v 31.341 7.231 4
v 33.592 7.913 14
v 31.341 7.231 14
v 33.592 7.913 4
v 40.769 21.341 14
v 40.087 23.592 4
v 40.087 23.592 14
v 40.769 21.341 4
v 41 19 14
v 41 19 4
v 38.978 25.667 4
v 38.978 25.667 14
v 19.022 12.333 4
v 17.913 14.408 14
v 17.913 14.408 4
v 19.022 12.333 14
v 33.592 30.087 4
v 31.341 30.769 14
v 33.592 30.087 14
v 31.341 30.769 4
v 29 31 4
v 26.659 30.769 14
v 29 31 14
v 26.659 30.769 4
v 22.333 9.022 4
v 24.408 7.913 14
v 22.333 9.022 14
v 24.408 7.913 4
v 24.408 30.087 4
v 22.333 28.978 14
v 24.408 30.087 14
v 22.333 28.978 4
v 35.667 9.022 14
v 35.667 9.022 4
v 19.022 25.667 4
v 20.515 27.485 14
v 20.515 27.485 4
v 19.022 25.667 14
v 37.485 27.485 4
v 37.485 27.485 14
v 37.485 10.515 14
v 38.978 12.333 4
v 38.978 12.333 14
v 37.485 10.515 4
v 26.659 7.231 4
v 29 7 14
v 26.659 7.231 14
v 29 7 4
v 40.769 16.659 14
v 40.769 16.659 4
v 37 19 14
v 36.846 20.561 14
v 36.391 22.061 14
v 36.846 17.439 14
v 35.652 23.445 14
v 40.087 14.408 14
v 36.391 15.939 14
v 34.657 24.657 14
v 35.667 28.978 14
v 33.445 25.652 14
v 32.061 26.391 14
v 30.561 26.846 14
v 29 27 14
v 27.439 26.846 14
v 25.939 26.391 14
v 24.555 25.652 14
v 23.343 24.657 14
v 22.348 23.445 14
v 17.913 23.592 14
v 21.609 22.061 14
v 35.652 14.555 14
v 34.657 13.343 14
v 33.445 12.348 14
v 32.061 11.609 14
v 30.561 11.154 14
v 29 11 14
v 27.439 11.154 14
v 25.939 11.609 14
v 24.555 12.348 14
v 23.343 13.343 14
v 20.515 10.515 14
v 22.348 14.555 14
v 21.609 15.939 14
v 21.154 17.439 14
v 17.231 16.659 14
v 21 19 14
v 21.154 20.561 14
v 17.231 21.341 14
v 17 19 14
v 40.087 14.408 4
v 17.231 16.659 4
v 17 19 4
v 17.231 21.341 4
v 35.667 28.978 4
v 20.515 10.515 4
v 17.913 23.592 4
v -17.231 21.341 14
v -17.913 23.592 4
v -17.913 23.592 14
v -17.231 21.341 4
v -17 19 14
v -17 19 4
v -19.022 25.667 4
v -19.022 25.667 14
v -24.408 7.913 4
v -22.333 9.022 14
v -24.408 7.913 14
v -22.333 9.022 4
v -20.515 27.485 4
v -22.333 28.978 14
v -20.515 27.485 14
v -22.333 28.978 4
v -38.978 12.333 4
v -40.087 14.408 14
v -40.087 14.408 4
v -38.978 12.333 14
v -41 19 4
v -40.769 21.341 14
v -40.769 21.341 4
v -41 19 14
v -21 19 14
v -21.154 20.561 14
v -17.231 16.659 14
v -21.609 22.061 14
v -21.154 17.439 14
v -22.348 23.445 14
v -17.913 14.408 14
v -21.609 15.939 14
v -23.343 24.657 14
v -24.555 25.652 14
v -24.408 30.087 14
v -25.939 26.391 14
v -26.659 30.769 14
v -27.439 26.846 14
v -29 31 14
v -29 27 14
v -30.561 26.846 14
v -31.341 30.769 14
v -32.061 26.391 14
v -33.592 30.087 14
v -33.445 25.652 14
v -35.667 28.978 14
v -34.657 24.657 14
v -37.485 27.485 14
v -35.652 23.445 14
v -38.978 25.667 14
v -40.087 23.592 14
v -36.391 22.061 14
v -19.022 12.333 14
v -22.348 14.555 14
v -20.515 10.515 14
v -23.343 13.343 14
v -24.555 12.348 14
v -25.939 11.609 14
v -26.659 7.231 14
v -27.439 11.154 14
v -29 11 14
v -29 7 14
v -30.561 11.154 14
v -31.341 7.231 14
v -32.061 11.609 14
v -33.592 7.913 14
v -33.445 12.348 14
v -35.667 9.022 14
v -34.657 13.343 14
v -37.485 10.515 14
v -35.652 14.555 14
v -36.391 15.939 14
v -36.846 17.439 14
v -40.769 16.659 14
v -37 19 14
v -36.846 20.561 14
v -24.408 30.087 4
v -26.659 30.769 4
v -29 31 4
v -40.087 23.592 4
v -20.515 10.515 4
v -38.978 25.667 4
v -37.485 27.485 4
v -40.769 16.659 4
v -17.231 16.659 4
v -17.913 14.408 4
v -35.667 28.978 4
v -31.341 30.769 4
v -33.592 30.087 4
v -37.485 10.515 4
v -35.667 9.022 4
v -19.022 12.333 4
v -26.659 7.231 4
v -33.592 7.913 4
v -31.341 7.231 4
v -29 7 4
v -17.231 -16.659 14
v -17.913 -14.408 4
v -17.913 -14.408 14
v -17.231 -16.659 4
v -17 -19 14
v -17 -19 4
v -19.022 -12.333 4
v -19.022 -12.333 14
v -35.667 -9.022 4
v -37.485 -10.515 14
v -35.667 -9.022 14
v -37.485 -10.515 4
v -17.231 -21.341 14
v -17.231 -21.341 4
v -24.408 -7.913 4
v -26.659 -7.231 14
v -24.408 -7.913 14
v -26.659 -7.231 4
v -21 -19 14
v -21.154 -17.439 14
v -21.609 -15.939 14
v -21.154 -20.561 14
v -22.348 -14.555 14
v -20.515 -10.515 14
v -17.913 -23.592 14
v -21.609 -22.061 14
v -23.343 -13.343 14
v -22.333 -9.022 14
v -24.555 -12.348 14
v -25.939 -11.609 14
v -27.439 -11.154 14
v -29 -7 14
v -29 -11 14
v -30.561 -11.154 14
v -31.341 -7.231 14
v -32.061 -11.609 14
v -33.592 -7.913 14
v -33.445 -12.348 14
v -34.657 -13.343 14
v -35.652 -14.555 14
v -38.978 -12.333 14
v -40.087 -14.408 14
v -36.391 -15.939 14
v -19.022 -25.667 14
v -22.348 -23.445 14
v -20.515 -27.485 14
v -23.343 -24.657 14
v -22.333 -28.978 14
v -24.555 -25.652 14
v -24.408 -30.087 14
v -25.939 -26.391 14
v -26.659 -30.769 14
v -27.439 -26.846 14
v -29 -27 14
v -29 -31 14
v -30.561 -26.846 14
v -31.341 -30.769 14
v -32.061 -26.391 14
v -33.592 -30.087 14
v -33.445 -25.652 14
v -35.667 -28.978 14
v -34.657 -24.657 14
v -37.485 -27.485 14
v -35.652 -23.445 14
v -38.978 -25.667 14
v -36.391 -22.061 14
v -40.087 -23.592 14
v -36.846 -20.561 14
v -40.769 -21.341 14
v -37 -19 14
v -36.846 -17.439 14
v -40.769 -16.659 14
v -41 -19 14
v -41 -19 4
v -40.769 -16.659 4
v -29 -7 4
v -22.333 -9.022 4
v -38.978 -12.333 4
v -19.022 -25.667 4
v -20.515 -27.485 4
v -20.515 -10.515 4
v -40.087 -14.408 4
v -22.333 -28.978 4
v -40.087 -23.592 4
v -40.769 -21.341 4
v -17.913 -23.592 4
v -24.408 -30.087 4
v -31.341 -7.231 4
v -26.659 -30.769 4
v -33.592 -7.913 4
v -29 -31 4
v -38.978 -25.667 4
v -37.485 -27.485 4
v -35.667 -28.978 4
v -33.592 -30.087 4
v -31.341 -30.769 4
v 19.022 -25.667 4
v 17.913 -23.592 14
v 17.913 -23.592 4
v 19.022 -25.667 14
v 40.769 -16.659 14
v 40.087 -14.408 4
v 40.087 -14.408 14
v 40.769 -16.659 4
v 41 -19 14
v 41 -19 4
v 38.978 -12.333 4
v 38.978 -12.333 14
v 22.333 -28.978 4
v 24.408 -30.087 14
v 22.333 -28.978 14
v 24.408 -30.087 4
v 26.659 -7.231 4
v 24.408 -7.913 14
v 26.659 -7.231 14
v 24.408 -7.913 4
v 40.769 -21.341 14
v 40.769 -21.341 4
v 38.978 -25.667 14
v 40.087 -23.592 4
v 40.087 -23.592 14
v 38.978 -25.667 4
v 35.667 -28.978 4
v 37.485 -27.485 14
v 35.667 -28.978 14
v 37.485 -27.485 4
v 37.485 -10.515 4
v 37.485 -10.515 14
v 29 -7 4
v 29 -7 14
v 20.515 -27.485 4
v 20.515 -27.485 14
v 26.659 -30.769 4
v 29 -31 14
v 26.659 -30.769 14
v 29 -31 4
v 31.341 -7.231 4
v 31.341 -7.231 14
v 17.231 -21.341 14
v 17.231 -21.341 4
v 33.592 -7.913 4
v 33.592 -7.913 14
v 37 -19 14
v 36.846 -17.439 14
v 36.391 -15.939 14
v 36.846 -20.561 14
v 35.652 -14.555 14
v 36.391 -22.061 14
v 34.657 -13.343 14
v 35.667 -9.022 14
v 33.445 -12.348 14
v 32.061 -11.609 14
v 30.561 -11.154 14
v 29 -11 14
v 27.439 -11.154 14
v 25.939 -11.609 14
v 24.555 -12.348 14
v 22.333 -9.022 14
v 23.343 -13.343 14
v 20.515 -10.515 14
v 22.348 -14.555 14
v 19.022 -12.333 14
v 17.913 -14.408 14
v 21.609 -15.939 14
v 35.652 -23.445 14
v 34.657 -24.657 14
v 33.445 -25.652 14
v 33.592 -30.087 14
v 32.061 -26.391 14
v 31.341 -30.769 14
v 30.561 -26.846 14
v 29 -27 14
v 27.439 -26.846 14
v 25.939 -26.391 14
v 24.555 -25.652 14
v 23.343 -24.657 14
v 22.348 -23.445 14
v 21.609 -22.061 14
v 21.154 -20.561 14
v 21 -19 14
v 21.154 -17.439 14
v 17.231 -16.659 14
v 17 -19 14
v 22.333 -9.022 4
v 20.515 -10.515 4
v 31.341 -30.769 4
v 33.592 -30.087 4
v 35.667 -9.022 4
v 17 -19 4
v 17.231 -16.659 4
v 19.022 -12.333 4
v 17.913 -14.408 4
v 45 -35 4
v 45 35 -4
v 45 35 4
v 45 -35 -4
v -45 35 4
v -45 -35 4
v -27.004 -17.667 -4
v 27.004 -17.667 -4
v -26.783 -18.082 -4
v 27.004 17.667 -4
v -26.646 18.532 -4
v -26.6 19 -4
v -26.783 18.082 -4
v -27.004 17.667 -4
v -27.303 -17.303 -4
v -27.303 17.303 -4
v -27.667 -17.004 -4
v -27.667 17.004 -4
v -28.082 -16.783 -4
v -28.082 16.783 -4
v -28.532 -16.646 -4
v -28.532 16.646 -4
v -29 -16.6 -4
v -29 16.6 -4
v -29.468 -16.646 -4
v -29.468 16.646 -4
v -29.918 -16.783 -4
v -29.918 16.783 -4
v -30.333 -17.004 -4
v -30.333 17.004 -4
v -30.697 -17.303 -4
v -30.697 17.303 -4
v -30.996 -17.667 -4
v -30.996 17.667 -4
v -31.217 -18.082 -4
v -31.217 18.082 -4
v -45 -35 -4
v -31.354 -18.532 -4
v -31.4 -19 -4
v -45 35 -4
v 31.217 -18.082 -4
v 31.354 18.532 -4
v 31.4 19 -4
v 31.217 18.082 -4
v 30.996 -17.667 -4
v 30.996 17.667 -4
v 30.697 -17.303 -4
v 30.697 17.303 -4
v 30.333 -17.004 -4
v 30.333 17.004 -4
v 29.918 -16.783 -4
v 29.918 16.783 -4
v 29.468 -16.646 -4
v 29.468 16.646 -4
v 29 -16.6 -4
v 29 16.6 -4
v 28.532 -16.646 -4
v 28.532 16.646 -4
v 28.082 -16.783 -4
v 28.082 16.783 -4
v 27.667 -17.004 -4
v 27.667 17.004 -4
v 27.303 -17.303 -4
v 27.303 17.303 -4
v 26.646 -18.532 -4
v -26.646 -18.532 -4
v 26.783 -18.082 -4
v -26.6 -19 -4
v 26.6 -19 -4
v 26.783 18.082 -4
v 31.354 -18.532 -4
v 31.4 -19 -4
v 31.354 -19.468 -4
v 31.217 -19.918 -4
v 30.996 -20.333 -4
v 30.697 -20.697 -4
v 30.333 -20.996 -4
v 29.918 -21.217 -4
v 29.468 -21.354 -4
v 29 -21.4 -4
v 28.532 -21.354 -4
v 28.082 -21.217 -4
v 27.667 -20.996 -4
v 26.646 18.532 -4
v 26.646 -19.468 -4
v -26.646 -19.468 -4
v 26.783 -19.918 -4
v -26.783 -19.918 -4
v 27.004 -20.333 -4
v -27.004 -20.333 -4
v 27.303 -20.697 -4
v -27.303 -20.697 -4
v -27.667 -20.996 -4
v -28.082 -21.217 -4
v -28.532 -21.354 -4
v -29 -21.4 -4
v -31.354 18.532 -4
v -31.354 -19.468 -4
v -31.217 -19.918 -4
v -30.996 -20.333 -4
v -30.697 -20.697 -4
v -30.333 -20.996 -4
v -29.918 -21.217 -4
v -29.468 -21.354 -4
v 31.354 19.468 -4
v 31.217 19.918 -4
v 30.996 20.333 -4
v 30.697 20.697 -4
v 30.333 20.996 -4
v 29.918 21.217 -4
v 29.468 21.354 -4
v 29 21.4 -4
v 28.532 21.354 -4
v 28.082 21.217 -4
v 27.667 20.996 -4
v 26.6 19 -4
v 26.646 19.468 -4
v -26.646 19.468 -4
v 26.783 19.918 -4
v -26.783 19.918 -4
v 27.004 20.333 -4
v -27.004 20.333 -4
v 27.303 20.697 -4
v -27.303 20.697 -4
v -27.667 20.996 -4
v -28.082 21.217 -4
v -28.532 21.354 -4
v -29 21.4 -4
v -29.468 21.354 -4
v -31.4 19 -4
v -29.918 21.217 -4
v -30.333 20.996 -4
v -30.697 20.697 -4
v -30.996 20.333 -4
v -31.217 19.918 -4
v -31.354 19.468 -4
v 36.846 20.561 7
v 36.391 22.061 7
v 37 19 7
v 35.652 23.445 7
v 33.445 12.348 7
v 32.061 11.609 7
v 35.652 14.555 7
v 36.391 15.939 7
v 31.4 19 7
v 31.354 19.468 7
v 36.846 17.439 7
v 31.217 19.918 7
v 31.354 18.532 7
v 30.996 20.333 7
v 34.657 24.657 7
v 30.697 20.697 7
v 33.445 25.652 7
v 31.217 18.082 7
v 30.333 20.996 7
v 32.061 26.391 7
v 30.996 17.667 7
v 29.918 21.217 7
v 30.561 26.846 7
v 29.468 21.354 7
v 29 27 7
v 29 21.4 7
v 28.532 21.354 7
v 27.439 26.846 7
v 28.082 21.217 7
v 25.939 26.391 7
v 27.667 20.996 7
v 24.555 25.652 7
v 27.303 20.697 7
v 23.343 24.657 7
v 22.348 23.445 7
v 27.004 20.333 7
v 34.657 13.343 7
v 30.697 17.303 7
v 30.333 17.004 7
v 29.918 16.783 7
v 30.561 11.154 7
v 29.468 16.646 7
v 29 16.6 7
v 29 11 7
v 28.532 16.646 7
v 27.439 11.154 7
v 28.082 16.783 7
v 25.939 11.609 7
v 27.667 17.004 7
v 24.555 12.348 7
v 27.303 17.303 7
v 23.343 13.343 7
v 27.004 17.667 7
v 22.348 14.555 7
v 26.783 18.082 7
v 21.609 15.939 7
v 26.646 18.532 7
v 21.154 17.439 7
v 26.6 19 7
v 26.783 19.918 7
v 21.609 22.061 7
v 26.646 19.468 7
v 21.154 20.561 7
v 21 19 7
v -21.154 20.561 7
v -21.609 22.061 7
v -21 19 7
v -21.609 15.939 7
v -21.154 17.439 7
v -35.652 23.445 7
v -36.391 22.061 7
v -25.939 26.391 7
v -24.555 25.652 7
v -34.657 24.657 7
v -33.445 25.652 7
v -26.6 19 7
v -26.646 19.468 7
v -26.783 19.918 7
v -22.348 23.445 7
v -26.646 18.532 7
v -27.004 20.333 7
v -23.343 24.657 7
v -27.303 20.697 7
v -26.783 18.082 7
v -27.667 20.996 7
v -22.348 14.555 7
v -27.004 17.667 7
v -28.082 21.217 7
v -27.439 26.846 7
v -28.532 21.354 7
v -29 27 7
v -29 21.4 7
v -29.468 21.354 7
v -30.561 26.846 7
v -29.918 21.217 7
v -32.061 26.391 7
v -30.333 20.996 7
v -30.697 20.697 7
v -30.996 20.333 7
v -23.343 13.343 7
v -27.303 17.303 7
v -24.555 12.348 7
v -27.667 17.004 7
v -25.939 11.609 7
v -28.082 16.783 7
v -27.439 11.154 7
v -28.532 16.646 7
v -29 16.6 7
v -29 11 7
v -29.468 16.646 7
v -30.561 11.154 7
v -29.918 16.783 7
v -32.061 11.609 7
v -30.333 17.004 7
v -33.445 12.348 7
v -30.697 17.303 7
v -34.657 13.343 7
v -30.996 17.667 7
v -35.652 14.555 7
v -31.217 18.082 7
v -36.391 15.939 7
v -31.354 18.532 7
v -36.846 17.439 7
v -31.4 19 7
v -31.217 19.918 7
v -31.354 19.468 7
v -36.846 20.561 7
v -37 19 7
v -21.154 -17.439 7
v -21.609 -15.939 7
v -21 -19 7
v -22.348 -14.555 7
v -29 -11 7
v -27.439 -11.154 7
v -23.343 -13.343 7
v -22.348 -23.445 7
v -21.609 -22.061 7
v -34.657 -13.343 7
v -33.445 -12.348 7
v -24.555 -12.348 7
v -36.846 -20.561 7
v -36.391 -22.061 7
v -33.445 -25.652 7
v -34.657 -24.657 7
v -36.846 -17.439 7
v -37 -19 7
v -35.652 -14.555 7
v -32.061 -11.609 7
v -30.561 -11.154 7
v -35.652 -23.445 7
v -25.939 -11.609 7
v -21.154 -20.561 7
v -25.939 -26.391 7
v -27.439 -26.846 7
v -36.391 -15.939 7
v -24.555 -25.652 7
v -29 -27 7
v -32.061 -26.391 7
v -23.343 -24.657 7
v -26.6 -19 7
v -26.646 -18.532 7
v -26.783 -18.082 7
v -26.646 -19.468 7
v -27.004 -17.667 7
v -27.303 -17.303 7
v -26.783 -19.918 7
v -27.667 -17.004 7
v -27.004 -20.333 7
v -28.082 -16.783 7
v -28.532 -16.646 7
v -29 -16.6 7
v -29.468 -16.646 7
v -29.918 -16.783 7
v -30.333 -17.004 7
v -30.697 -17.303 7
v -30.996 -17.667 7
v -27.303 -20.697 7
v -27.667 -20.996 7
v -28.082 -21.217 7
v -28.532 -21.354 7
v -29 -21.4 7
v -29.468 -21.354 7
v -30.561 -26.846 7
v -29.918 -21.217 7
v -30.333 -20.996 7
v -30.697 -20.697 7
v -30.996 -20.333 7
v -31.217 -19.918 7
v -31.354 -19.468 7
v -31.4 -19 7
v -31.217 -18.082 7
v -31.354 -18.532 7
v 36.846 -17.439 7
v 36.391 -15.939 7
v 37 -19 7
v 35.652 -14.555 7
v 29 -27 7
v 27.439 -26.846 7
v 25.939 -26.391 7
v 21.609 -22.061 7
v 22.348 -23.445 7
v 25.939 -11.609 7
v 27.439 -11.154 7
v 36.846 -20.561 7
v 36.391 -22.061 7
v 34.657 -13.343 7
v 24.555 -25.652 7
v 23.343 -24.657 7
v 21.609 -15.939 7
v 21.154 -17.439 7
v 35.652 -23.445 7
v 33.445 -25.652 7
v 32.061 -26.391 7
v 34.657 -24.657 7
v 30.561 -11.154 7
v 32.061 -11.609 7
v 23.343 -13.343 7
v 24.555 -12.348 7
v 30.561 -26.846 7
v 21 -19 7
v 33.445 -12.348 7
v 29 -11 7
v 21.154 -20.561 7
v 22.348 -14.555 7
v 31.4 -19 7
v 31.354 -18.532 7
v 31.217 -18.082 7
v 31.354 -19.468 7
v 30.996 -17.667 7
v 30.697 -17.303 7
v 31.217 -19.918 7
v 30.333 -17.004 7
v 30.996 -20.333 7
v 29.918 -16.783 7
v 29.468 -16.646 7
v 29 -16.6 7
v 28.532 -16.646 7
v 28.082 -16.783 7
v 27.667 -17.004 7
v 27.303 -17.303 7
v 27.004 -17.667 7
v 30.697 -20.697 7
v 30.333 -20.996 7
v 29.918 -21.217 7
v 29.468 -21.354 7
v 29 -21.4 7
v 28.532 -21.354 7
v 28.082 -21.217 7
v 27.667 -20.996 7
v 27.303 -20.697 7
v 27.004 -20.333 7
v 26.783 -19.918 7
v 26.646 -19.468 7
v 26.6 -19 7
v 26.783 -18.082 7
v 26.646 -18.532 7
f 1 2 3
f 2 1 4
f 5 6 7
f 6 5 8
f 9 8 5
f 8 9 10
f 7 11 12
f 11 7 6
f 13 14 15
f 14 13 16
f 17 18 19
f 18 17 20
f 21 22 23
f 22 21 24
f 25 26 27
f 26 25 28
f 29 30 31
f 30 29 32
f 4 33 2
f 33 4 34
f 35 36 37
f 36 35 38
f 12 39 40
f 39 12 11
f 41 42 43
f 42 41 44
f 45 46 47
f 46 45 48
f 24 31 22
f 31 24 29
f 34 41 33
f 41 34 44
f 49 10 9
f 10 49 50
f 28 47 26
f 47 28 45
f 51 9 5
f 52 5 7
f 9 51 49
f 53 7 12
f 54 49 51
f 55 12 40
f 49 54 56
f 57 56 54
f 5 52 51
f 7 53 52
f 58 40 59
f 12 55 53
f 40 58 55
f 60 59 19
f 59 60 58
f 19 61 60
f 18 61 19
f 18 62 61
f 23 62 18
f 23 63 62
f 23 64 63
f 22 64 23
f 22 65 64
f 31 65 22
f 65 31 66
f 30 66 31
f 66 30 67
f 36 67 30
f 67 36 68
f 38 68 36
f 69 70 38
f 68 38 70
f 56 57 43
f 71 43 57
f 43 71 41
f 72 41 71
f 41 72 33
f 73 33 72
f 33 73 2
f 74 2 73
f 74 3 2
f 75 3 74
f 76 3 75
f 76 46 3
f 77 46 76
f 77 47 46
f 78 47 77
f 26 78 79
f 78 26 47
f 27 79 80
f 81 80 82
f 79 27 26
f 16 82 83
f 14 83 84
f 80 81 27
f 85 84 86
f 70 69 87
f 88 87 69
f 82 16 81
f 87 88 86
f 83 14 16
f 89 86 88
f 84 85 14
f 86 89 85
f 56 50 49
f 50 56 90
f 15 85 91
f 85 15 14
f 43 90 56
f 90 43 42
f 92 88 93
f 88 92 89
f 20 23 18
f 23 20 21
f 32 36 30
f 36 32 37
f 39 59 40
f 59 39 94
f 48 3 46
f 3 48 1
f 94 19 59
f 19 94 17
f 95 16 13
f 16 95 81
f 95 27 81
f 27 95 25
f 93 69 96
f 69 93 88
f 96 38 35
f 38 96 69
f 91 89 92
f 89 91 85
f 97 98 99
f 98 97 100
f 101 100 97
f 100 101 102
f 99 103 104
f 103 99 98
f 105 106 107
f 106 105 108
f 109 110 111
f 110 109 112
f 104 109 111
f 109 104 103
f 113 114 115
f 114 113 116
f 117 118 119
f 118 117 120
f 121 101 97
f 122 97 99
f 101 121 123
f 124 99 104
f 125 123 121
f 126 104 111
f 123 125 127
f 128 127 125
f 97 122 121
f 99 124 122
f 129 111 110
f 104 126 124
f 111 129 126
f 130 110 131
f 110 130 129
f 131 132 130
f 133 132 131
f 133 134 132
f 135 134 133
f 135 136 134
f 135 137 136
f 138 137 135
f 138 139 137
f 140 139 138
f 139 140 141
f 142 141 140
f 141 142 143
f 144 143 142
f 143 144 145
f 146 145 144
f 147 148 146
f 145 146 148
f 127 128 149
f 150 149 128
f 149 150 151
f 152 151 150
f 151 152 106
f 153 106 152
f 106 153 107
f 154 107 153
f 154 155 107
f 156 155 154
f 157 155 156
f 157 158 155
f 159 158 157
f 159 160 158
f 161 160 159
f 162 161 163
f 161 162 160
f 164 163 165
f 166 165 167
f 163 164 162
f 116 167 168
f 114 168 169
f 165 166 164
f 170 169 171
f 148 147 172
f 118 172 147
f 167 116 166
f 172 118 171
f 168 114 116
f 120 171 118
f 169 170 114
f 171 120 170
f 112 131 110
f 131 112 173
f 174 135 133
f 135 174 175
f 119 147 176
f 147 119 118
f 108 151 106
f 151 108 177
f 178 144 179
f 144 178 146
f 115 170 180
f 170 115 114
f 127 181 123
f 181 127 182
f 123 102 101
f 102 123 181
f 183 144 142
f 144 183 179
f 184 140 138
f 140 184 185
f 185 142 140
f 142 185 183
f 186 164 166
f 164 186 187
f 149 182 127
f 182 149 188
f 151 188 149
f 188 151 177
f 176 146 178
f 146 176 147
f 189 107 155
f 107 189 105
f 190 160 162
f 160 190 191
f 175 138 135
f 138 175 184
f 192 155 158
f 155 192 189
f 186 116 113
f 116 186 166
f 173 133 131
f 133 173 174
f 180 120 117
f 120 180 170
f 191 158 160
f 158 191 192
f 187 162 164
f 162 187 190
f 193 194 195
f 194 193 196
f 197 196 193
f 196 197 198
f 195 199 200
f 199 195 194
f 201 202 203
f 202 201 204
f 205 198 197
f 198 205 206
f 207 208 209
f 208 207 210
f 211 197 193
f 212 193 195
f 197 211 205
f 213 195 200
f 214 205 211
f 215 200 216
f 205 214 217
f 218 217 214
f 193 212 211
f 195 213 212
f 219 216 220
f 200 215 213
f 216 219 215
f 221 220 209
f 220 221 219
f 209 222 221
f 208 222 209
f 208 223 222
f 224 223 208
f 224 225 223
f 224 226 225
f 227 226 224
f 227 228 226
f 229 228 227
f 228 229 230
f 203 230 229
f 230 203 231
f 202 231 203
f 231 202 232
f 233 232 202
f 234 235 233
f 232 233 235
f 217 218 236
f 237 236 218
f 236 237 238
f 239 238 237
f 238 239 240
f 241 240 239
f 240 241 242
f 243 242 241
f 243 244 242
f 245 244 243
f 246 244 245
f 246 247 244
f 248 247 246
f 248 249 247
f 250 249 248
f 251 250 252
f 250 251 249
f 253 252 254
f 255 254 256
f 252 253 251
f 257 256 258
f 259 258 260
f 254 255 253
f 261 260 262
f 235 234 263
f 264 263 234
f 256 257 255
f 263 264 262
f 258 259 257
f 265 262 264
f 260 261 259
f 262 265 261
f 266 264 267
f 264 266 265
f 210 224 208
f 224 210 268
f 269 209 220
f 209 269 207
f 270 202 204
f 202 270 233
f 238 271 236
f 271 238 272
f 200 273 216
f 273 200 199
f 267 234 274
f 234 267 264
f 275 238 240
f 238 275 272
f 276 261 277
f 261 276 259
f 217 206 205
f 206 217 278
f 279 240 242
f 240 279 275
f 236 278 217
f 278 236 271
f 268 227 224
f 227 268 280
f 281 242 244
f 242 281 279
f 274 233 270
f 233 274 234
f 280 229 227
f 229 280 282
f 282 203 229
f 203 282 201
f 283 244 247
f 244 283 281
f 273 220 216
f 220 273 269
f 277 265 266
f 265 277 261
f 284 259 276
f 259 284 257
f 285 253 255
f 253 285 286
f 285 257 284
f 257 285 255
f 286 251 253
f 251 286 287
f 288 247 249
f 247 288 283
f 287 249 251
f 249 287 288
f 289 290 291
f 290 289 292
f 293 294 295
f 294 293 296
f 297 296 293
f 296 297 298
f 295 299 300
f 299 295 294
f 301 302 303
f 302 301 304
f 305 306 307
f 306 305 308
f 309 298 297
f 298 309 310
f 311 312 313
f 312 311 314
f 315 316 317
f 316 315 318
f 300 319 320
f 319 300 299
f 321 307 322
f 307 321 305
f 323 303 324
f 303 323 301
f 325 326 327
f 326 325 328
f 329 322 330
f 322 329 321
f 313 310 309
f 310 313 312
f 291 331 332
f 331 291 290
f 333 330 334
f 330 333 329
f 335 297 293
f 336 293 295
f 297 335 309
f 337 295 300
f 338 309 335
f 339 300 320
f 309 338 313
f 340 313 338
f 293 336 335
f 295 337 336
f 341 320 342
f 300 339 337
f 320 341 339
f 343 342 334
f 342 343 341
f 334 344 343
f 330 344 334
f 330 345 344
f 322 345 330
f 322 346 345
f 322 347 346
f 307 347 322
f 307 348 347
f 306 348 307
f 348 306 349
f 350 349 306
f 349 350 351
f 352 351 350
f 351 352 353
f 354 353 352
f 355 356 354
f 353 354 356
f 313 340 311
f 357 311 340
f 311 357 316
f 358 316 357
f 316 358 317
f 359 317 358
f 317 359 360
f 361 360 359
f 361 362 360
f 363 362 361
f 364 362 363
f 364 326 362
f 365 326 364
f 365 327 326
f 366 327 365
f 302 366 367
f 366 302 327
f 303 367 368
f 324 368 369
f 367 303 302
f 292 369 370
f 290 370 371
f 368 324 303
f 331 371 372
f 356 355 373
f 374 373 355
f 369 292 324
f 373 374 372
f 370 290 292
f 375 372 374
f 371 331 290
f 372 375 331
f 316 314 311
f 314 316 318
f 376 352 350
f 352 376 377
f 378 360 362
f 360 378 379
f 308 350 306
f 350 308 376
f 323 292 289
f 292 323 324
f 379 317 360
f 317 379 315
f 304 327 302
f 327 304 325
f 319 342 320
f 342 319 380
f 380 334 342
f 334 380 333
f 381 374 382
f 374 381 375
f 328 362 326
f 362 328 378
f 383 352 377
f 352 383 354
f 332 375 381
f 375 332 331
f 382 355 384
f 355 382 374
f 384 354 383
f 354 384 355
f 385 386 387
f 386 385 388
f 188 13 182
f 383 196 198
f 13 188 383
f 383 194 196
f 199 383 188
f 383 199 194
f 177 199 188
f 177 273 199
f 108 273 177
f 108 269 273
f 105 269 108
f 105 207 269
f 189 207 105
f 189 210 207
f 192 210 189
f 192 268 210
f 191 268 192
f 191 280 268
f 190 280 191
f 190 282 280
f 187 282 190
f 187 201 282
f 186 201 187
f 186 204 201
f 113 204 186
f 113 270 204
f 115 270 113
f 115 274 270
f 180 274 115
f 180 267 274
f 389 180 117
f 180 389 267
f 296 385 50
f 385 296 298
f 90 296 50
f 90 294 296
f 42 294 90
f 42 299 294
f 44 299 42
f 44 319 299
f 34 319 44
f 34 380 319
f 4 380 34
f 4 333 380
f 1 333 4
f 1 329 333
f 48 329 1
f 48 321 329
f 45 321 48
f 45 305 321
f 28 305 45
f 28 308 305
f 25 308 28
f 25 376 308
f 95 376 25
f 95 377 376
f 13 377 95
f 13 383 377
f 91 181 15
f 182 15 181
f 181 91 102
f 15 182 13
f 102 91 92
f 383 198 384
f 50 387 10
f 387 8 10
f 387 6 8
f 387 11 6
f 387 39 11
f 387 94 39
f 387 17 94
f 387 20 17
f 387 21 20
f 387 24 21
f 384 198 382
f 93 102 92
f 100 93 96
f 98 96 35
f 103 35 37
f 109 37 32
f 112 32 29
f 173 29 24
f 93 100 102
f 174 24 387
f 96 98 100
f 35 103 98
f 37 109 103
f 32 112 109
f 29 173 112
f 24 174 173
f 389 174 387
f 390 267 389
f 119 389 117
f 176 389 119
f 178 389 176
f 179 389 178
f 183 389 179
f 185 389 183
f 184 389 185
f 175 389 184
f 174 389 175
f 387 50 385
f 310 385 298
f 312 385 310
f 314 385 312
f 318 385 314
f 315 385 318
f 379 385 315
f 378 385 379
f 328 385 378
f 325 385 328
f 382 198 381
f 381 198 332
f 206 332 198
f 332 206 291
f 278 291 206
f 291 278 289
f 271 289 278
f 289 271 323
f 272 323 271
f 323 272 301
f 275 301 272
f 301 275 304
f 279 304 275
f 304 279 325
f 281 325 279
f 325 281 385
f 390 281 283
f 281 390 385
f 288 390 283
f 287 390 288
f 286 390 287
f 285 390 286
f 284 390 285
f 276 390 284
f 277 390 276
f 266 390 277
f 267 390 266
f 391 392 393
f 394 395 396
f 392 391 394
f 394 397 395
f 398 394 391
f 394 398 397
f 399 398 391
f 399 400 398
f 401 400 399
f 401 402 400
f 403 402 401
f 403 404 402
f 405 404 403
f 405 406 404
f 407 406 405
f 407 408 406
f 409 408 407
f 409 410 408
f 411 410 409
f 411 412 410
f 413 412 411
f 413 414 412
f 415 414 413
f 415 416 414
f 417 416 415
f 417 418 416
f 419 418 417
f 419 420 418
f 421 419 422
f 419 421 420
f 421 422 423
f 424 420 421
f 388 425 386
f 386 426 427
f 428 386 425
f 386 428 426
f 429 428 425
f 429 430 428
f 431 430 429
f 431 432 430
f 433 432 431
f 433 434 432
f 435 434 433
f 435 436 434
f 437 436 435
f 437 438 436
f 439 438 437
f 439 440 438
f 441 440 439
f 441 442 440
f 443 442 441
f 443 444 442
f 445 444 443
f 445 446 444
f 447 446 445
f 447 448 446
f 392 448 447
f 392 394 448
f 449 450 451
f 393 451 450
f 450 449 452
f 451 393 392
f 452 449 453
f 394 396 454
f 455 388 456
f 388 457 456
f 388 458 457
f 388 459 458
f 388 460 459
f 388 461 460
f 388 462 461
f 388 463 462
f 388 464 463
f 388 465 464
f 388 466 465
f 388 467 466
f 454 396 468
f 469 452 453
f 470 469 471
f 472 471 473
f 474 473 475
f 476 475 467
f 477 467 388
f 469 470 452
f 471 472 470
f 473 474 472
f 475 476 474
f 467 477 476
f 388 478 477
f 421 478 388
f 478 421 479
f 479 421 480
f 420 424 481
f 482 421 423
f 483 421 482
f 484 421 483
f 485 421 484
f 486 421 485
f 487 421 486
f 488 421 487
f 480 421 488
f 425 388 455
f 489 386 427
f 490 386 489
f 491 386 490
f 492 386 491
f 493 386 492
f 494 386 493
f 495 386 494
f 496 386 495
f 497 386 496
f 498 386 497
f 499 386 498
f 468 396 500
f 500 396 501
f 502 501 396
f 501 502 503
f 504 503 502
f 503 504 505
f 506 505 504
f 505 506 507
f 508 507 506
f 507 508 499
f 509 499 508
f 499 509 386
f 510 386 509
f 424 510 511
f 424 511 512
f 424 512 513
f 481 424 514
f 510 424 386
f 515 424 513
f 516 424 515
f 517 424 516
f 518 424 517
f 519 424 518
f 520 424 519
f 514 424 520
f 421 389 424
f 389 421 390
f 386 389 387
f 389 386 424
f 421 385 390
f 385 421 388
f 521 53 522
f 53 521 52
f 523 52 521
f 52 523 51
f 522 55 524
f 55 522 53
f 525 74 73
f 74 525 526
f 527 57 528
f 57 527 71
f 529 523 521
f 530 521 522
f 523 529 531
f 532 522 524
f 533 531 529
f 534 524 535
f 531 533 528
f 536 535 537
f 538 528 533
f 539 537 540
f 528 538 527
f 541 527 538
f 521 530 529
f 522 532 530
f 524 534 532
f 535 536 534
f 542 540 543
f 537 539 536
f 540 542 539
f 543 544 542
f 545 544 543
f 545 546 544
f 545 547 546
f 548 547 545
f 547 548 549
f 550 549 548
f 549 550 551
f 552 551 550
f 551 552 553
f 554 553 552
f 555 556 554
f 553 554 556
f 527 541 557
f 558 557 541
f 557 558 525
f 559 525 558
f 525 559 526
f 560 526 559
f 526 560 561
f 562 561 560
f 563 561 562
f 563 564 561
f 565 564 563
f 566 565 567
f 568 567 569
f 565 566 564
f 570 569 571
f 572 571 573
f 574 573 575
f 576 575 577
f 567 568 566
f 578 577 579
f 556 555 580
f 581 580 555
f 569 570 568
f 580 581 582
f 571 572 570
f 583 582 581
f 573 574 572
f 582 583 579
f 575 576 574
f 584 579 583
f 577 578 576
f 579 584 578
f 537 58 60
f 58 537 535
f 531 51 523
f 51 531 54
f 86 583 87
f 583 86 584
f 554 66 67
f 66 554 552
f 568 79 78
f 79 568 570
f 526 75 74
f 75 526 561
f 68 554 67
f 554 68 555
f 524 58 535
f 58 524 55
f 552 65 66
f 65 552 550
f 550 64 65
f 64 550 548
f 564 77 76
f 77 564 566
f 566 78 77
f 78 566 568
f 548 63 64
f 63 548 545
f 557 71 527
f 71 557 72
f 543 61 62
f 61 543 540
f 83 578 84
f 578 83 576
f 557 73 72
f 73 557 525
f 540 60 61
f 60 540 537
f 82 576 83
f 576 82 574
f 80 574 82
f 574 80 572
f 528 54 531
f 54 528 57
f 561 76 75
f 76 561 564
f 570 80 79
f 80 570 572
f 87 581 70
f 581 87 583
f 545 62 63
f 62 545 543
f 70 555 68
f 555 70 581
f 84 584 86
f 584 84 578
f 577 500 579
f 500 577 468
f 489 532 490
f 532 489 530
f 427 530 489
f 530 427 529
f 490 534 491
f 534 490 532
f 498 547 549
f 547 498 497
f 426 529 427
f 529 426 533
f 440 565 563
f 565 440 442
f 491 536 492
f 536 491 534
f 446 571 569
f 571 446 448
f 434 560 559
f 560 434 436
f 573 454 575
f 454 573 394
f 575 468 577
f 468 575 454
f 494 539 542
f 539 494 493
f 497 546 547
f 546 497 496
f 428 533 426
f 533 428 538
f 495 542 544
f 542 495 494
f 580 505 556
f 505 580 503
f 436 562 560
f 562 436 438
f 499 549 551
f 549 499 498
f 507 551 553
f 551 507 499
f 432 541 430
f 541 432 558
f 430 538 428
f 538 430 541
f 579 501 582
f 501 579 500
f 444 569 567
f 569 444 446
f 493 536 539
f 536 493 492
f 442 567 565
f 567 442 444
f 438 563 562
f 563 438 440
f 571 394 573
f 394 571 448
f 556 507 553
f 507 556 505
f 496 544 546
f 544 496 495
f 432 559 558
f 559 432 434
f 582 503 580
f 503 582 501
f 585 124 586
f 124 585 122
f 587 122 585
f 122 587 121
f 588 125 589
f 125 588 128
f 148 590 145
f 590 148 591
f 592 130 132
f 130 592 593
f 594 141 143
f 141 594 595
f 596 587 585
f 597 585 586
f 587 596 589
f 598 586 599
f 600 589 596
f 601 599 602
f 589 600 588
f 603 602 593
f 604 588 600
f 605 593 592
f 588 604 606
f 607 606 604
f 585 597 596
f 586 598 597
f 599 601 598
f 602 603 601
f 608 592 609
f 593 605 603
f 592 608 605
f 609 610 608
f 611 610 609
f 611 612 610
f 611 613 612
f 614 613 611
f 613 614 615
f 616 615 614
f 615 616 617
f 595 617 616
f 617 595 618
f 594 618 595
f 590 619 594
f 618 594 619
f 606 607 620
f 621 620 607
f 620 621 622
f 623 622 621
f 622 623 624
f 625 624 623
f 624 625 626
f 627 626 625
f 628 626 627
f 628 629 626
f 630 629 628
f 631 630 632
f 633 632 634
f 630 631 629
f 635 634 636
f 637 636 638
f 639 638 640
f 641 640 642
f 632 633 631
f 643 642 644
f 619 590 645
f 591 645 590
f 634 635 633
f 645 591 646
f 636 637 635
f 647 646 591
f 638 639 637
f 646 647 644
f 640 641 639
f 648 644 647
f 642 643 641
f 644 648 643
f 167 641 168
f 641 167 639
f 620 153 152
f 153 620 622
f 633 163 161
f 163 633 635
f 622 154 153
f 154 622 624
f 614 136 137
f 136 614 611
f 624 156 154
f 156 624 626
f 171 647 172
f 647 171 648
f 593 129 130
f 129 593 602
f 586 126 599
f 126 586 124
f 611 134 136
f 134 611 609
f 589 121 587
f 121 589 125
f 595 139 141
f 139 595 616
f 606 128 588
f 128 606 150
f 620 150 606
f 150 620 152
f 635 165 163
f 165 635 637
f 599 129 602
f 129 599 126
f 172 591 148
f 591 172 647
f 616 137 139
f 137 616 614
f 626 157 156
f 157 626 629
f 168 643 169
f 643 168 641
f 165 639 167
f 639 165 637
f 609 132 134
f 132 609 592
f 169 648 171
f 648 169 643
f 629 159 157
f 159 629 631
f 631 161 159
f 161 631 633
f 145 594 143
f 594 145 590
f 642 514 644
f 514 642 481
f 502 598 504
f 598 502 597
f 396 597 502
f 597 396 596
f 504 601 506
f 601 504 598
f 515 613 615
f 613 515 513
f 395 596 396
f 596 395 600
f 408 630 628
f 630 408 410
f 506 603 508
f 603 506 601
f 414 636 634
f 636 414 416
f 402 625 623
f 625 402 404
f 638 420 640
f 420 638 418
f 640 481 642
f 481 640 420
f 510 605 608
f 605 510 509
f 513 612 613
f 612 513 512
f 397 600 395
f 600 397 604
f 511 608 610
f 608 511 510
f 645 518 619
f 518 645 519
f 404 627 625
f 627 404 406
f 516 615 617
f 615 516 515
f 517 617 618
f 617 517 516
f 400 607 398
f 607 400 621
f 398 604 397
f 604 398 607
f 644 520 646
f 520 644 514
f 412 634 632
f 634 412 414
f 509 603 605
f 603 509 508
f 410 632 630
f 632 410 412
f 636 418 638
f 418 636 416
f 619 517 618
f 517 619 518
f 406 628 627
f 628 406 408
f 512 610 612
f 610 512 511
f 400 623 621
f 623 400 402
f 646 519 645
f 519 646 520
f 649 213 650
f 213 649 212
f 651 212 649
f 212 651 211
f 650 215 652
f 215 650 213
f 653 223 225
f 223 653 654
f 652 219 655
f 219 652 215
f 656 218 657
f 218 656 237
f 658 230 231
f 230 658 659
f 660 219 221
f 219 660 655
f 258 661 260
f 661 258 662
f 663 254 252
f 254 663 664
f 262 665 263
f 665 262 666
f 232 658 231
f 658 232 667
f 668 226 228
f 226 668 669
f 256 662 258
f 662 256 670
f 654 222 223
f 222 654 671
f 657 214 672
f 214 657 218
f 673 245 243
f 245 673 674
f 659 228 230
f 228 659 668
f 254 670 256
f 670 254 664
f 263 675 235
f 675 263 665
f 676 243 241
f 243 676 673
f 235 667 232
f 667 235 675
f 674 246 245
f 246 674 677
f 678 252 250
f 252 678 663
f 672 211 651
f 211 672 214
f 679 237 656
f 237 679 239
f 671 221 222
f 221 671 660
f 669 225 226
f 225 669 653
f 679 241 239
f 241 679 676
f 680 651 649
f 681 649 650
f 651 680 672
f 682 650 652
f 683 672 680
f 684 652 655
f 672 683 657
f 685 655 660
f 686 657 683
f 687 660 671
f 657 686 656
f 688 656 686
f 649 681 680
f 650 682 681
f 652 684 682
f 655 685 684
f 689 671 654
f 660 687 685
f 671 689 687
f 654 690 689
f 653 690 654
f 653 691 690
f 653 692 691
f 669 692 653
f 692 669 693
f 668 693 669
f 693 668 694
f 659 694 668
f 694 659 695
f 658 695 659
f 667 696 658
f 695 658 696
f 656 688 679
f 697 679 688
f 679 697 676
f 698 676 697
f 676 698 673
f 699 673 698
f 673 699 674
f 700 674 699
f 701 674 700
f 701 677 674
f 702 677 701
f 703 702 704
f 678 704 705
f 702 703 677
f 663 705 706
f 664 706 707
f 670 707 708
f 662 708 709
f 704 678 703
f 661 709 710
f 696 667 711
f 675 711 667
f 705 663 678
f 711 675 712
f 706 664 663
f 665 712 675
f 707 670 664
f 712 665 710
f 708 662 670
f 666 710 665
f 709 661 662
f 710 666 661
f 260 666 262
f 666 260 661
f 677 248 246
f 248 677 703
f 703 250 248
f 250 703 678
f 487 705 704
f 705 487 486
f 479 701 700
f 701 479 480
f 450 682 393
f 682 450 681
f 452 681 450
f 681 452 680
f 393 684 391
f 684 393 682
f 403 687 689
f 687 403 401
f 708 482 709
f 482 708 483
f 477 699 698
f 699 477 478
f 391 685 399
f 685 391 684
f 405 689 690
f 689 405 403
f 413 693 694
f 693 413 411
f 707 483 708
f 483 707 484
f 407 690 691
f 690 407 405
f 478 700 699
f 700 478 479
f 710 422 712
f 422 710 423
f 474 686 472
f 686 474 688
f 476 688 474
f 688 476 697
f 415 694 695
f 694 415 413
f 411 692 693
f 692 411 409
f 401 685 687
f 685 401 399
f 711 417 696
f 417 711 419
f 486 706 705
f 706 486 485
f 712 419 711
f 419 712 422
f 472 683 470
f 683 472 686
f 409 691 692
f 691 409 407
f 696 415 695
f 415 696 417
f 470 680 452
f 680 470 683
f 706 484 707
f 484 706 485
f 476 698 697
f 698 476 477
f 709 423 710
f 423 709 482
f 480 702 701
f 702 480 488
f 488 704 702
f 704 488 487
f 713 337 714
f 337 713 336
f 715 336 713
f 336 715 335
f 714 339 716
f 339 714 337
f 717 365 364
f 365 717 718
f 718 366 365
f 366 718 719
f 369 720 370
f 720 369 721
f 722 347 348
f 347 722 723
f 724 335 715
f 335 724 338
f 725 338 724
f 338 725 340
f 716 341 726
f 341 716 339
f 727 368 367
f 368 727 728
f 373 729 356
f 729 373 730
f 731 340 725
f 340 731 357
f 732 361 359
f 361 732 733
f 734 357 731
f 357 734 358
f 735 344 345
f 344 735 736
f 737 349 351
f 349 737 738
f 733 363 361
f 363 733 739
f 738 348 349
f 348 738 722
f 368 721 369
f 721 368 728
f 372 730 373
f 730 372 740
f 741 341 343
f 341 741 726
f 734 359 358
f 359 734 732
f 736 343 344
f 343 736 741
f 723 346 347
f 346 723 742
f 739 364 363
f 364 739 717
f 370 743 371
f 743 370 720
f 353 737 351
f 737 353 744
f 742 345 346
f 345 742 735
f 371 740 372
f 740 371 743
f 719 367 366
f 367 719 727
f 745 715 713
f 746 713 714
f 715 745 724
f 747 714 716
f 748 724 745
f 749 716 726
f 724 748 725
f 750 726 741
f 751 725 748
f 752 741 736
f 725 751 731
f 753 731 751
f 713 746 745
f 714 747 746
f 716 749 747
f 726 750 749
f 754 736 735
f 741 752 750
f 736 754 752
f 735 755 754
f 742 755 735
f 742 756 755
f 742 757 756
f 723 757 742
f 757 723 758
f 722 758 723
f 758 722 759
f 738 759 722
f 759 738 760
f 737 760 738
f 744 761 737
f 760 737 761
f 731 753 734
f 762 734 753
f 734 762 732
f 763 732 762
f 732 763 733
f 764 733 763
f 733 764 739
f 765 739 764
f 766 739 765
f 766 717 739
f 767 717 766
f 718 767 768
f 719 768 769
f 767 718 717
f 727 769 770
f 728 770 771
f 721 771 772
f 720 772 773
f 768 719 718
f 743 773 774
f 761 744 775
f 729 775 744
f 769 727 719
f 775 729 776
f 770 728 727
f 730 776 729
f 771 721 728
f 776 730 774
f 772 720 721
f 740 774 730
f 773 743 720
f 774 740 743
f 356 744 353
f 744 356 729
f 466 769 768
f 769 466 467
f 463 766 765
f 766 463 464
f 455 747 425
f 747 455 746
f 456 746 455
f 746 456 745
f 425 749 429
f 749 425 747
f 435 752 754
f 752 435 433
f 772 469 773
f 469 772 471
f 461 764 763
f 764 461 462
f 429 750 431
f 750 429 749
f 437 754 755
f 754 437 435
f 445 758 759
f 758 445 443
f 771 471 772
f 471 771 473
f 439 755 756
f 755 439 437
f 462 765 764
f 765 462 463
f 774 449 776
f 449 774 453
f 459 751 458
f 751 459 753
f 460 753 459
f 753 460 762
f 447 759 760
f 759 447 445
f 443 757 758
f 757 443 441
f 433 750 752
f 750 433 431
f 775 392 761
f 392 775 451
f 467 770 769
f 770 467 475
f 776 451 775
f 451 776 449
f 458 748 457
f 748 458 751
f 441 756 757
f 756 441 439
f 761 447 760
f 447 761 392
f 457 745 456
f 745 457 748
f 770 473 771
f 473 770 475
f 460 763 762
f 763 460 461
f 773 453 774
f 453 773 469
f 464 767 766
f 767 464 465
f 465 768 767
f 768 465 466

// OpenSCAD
$fn = 32;

// ----------------------------------------------------------------------
// Socket pad plate
// bosses with counterbored sockets for the screws
// ----------------------------------------------------------------------

// --- parameters (mm) ---
base_t = 8;           // base plate thickness
boss_h = 10;          // boss height above the base plate
boss_d = 24;          // boss diameter
socket_d = 16;        // socket diameter
socket_depth = 7;     // socket depth from the boss face
bolt_d = 4.8;         // screw clearance hole through the socket floor
plate = [90, 70, 8];  // overall size (x, y, z)
edge = 16;            // boss centre offset from the plate edge
pads = 4;             // boss count, one per corner

// --- derived feature positions (mm) ---
height = base_t + boss_h;        // = 18   overall height of the part
corner_x = plate[0] / 2 - edge;  // = 29   boss centre X
corner_y = plate[1] / 2 - edge;  // = 19   boss centre Y
feature_centers = [
  [corner_x, corner_y],
  [-corner_x, corner_y],
  [-corner_x, -corner_y],
  [corner_x, -corner_y]
];   // boss centres: sockets, holes and the pads themselves are placed from here

// base plate, bosses on feature_centers, socket + through hole in each
difference() {
  union() {
    cube(plate, center = true);
    for (centre = feature_centers)
      translate([centre[0], centre[1], plate[2] / 2 - 1])
        cylinder(d = boss_d, h = boss_h + 1);
  }
  for (centre = feature_centers) {
    translate([centre[0], centre[1], plate[2] / 2 + boss_h - socket_depth])
      cylinder(d = socket_d, h = socket_depth + 1);
    translate([centre[0], centre[1], -height])
      cylinder(d = bolt_d, h = 2 * height + 2);  // through the socket floor
  }
}
